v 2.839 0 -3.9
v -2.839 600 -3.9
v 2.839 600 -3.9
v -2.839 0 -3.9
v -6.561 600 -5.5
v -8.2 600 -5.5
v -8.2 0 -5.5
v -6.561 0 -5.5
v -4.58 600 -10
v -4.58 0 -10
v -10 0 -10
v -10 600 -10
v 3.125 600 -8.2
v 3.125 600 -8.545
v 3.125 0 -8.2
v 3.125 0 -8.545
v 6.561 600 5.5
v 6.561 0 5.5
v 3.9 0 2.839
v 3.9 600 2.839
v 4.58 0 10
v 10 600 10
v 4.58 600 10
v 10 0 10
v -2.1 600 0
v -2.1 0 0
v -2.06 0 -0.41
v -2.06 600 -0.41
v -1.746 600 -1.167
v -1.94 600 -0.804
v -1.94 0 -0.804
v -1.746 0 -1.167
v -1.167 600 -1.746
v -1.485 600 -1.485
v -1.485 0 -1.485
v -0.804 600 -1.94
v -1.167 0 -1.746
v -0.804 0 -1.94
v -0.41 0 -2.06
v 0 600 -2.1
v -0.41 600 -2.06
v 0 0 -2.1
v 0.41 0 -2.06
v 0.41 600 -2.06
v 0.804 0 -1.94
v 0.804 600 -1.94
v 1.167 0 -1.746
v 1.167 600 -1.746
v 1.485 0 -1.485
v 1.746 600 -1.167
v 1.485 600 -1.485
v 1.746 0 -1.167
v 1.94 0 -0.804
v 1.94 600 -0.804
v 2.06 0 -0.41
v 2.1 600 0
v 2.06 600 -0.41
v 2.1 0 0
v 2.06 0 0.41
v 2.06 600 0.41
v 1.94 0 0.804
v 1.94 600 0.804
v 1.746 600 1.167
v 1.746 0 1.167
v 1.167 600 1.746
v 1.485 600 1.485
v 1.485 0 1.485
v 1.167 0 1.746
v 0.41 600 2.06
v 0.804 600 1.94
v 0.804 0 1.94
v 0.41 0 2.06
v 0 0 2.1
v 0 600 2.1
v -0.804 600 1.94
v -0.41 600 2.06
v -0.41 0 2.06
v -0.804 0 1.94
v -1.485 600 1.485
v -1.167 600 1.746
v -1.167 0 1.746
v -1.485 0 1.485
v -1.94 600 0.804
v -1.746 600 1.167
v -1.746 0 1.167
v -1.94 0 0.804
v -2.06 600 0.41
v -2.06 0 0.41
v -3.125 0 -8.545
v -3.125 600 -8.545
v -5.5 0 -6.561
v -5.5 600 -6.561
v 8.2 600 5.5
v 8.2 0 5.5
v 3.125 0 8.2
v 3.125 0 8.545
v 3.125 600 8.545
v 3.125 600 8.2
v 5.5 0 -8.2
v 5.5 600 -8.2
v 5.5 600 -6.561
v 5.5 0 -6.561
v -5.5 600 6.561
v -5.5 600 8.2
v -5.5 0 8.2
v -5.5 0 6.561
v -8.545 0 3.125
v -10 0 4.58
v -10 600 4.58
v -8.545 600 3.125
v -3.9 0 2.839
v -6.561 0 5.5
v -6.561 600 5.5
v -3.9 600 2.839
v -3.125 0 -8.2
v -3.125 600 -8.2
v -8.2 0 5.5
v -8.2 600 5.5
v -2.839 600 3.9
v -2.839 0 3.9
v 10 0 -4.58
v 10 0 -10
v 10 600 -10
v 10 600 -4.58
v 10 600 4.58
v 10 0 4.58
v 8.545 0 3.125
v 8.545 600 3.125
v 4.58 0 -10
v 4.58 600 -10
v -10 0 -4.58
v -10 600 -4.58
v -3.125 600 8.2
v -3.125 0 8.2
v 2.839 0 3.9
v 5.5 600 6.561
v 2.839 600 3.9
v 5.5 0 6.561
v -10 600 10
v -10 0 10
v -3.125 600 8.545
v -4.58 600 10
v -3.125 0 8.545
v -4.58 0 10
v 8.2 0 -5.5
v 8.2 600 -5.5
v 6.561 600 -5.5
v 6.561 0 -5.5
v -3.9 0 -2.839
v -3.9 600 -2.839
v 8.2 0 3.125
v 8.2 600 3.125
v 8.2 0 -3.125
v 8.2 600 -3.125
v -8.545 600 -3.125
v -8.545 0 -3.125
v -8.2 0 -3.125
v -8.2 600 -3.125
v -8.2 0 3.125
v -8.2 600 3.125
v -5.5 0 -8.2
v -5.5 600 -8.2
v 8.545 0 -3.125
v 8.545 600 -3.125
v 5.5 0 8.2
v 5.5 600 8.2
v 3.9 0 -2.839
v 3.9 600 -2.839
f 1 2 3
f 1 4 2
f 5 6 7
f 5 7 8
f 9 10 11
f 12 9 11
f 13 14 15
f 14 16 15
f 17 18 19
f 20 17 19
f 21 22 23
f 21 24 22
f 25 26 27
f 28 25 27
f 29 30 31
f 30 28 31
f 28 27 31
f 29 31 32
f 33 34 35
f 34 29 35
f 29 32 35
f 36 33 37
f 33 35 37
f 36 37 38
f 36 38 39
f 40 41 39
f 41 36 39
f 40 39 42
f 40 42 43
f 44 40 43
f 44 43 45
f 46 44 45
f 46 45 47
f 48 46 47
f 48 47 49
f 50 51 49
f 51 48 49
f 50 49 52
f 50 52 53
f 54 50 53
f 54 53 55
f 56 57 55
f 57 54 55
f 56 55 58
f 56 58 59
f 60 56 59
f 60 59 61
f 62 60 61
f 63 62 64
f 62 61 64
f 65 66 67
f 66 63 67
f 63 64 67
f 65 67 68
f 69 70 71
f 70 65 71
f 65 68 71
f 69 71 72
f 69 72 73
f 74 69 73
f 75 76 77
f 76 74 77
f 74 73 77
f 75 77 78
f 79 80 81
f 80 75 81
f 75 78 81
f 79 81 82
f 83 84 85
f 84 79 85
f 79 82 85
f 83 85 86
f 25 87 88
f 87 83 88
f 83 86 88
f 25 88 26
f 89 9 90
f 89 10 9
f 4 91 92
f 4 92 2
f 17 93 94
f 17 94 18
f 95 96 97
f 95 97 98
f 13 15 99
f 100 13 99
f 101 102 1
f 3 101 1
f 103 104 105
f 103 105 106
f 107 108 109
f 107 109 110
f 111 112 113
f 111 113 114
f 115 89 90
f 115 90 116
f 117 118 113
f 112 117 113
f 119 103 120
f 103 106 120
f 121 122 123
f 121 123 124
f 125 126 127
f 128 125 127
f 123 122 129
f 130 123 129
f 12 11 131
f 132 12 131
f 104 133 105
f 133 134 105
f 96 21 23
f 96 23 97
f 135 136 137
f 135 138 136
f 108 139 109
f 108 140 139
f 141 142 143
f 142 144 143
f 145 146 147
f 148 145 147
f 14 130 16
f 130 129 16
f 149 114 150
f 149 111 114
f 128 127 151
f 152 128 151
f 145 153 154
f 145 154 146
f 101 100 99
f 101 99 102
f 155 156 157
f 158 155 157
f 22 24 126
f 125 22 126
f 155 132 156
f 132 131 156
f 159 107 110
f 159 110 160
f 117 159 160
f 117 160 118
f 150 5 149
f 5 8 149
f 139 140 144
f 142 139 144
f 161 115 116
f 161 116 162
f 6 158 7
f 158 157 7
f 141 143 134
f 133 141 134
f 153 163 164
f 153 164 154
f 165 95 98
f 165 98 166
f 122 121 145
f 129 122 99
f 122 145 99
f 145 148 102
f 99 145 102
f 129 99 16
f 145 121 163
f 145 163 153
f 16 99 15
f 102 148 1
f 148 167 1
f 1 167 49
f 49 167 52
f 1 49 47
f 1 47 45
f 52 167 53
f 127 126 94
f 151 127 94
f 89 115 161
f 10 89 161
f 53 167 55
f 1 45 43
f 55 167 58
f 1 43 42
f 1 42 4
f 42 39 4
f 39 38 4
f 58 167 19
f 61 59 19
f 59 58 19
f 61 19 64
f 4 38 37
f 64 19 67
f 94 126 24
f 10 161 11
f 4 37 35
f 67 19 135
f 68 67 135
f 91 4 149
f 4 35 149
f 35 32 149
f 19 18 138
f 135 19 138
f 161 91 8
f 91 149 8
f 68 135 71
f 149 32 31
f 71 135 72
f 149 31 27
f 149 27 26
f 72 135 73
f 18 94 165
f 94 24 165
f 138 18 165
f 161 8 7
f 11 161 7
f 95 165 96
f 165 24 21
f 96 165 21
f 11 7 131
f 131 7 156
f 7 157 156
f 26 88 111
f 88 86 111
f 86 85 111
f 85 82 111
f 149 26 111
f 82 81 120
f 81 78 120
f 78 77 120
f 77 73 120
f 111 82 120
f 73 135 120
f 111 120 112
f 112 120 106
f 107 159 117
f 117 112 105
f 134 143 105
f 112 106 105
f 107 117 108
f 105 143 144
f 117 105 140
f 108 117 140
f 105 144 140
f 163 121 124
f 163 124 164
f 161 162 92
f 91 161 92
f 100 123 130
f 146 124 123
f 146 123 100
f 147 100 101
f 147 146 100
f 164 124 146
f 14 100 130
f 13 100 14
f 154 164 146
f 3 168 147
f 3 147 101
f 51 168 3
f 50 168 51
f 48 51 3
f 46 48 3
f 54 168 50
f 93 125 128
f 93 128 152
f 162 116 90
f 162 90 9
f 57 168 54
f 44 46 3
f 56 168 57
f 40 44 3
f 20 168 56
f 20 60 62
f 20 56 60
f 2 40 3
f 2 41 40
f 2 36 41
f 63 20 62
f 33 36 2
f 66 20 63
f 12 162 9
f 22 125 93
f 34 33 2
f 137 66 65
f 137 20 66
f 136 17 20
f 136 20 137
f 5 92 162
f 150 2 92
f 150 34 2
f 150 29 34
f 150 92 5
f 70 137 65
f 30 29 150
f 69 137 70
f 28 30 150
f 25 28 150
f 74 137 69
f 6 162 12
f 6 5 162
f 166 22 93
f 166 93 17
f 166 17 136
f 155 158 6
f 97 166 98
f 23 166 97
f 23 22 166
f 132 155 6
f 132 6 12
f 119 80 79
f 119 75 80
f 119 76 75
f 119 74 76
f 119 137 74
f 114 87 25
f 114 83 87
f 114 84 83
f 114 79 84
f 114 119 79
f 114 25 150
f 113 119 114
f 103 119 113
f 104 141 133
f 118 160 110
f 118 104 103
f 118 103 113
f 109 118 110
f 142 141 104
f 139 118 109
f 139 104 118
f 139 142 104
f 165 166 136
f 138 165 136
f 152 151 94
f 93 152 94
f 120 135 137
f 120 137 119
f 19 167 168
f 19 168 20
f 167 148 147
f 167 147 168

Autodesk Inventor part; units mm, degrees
ref_plane "YZ Plane" through (0, 0, 0) normal (1, 0, 0) x (0, 1, 0)
ref_plane "XZ Plane" through (0, 0, 0) normal (0, 1, 0) x (-1, 0, 0)
ref_plane "XY Plane" through (0, 0, 0) normal (0, 0, 1) x (1, 0, 0)
sketch "Sketch1" plane through (0, 0, 0) normal (0, 1, 0) x (-1, 0, 0)
  circle A0 centre (0, 0) radius 2.1
  line L0 (10, 10) -> (-10, 10) construction
  line L1 (-10, 10) -> (-10, -10) construction
  line L2 (-10, -10) -> (10, -10)
  line L3 (10, -10) -> (10, 10) construction
  line L4 (10, 10) -> (-10, -10) construction
  line L5 (-10, 10) -> (10, -10) construction
  line L6 (8.2, 10) -> (8.2, -10) construction
  line L7 (3.9, 10) -> (3.9, -10) construction
  line L8 (8.2, 3.125) -> (8.2, -3.125) construction
  line L9 (10, 4.58) -> (10, -4.58) construction
  line L10 (8.2, 5.5) -> (8.2, -5.5) construction
  line L11 (3.3697, 4.4303) -> (4.4303, 3.3697) construction
  line L12 (10, 10) -> (10, 4.58)
  line L13 (10, 4.58) -> (8.545, 3.125)
  line L14 (8.545, 3.125) -> (8.2, 3.125)
  line L15 (8.2, 3.125) -> (8.2, 5.5)
  line L16 (14, 0) -> (-14, 0) construction
  line L17 (8.2, 5.5) -> (6.5607, 5.5)
  line L18 (6.5607, 5.5) -> (3.9, 2.8393)
  line L19 (3.9, 2.8393) -> (3.9, 0)
  line L20 (10, -10) -> (10, -4.58)
  line L21 (10, -4.58) -> (8.545, -3.125)
  line L22 (8.545, -3.125) -> (8.2, -3.125)
  line L23 (8.2, -3.125) -> (8.2, -5.5)
  line L24 (8.2, -5.5) -> (6.5607, -5.5)
  line L25 (6.5607, -5.5) -> (3.9, -2.8393)
  line L26 (3.9, -2.8393) -> (3.9, 0)
  line L27 (-10, 10) -> (-4.58, 10)
  line L28 (-4.58, 10) -> (-3.125, 8.545)
  line L29 (-3.125, 8.2) -> (-5.5, 8.2)
  line L30 (-5.5, 8.2) -> (-5.5, 6.5607)
  line L31 (-5.5, 6.5607) -> (-2.8393, 3.9)
  line L32 (-2.8393, 3.9) -> (0, 3.9)
  line L33 (2.8393, 3.9) -> (0, 3.9)
  line L34 (5.5, 6.5607) -> (2.8393, 3.9)
  line L35 (5.5, 8.2) -> (5.5, 6.5607)
  line L36 (3.125, 8.2) -> (5.5, 8.2)
  line L37 (3.125, 8.545) -> (3.125, 8.2)
  line L38 (4.58, 10) -> (3.125, 8.545)
  line L39 (-3.125, 8.545) -> (-3.125, 8.2)
  line L40 (10, 10) -> (4.58, 10)
  line L41 (-10, -10) -> (-10, -4.58)
  line L42 (-10, -4.58) -> (-8.545, -3.125)
  line L43 (-8.2, -3.125) -> (-8.2, -5.5)
  line L44 (-8.2, -5.5) -> (-6.5607, -5.5)
  line L45 (-6.5607, -5.5) -> (-3.9, -2.8393)
  line L46 (-3.9, -2.8393) -> (-3.9, 0)
  line L47 (-3.9, 2.8393) -> (-3.9, 0)
  line L48 (-6.5607, 5.5) -> (-3.9, 2.8393)
  line L49 (-8.2, 5.5) -> (-6.5607, 5.5)
  line L50 (-8.2, 3.125) -> (-8.2, 5.5)
  line L51 (-8.545, 3.125) -> (-8.2, 3.125)
  line L52 (-10, 4.58) -> (-8.545, 3.125)
  line L53 (-8.545, -3.125) -> (-8.2, -3.125)
  line L54 (-10, 10) -> (-10, 4.58)
  line L55 (10, -10) -> (4.58, -10) construction
  line L56 (4.58, -10) -> (3.125, -8.545)
  line L57 (3.125, -8.2) -> (5.5, -8.2)
  line L58 (5.5, -8.2) -> (5.5, -6.5607)
  line L59 (5.5, -6.5607) -> (2.8393, -3.9)
  line L60 (2.8393, -3.9) -> (0, -3.9)
  line L61 (-2.8393, -3.9) -> (0, -3.9)
  line L62 (-5.5, -6.5607) -> (-2.8393, -3.9)
  line L63 (-5.5, -8.2) -> (-5.5, -6.5607)
  line L64 (-3.125, -8.2) -> (-5.5, -8.2)
  line L65 (-3.125, -8.545) -> (-3.125, -8.2)
  line L66 (-4.58, -10) -> (-3.125, -8.545)
  line L67 (3.125, -8.545) -> (3.125, -8.2)
  line L68 (-10, -10) -> (-4.58, -10) construction
  line L69 (5.5, -6.5607) -> (6.2393, -7.3)
  line L70 (6.2393, -7.3) -> (8.2, -7.3)
  line L71 (0, -10) -> (0, -9) construction
  line L72 (-5.5, -6.5607) -> (-6.2393, -7.3)
  line L73 (-6.2393, -7.3) -> (-8.2, -7.3)
  line L74 (8.2, -7.3) -> (8.2, -10)
  line L75 (-8.2, -7.3) -> (-8.2, -10)
  circle A1 centre (0, -20) radius 2.1
  line L76 (10, -30) -> (10, -24.58)
  line L77 (10, -24.58) -> (8.545, -23.125)
  line L78 (8.545, -23.125) -> (8.2, -23.125)
  line L79 (8.2, -23.125) -> (8.2, -25.5)
  line L80 (8.2, -25.5) -> (6.5607, -25.5)
  line L81 (6.5607, -25.5) -> (3.9, -22.8393)
  line L82 (3.9, -22.8393) -> (3.9, -20)
  line L83 (10, -10) -> (10, -15.42)
  line L84 (10, -15.42) -> (8.545, -16.875)
  line L85 (8.2, -16.875) -> (8.2, -14.5)
  line L86 (8.2, -14.5) -> (6.5607, -14.5)
  line L87 (6.5607, -14.5) -> (3.9, -17.1607)
  line L88 (3.9, -17.1607) -> (3.9, -20)
  line L89 (-10, -30) -> (-4.58, -30)
  line L90 (-4.58, -30) -> (-3.125, -28.545)
  line L91 (-3.125, -28.2) -> (-5.5, -28.2)
  line L92 (-5.5, -28.2) -> (-5.5, -26.5607)
  line L93 (-5.5, -26.5607) -> (-2.8393, -23.9)
  line L94 (-2.8393, -23.9) -> (0, -23.9)
  line L95 (2.8393, -23.9) -> (0, -23.9)
  line L96 (5.5, -26.5607) -> (2.8393, -23.9)
  line L97 (5.5, -28.2) -> (5.5, -26.5607)
  line L98 (3.125, -28.2) -> (5.5, -28.2)
  line L99 (3.125, -28.545) -> (3.125, -28.2)
  line L100 (4.58, -30) -> (3.125, -28.545)
  line L101 (-3.125, -28.545) -> (-3.125, -28.2)
  line L102 (10, -30) -> (4.58, -30)
  line L103 (-10, -10) -> (-10, -15.42)
  line L104 (-10, -15.42) -> (-8.545, -16.875)
  line L105 (-8.2, -16.875) -> (-8.2, -14.5)
  line L106 (-8.2, -14.5) -> (-6.5607, -14.5)
  line L107 (-6.5607, -14.5) -> (-3.9, -17.1607)
  line L108 (-3.9, -17.1607) -> (-3.9, -20)
  line L109 (-3.9, -22.8393) -> (-3.9, -20)
  line L110 (-6.5607, -25.5) -> (-3.9, -22.8393)
  line L111 (-8.2, -25.5) -> (-6.5607, -25.5)
  line L112 (-8.2, -23.125) -> (-8.2, -25.5)
  line L113 (-8.545, -23.125) -> (-8.2, -23.125)
  line L114 (-10, -24.58) -> (-8.545, -23.125)
  line L115 (-8.545, -16.875) -> (-8.2, -16.875)
  line L116 (-10, -30) -> (-10, -24.58)
  line L117 (5.5, -13.4393) -> (2.8393, -16.1)
  line L118 (2.8393, -16.1) -> (0, -16.1)
  line L119 (-2.8393, -16.1) -> (0, -16.1)
  line L120 (-5.5, -13.4393) -> (-2.8393, -16.1)
  line L121 (5.5, -13.4393) -> (6.2393, -12.7)
  line L122 (6.2393, -12.7) -> (8.2, -12.7)
  line L123 (-5.5, -13.4393) -> (-6.2393, -12.7)
  line L124 (-6.2393, -12.7) -> (-8.2, -12.7)
  line L125 (8.2, -12.7) -> (8.2, -10)
  line L126 (-8.2, -12.7) -> (-8.2, -10)
  line L127 (8.545, -16.875) -> (8.2, -16.875)
  point P0 (10, 0)
  point P1 (8.2, 0)
  point P2 (3.9, 3.9)
  point P3 (-3.3697, 4.4303)
  point P4 (-4.4303, -3.3697)
  point P5 (3.3697, -4.4303)
  dimension "d0" = 4.2
  dimension "d1" = 20
  dimension "d2" = 20
  dimension "d3" = 1.8
  dimension "d4" = 4.3
  dimension "d5" = 6.25
  dimension "d6" = 9.16
  dimension "d7" = 11
  dimension "d8" = 1.5
  dimension "d9" = 45
  dimension "d12" = 360
  dimension "d17" = 1.8
  dimension "d18" = 1
extrude "Extrusion1" add sketch "Sketch1" along normal blind 600 contours L41 L42 L53 L43 L44 L45 L46 L47 L48 L49 L50 L51 L52 L54 L27 L28 L39 L29 L30 L31 L32 L33 L34 L35 L36 L37 L38 L40 L12 L13 L14 L15 L17 L18 L19 L26 L25 L24 L23 L22 L21 L20 L2 L74 L70 L69 L59 L60 L61 L62 L72 L73 L75 | L75 L73 L72 L63 L64 L65 L66 L2 | L56 L67 L57 L58 L69 L70 L74 L2
ref_plane "Work Plane1" through (-2.8393, 0, 0) normal (0, 0, -1) x (-1, 0, 0)
ref_plane "Work Plane2" through (0, 0, 4.58) normal (1, 0, 0) x (0, 0, -1)
ref_plane "Work Plane3" through (0, 300, 0) normal (0, 1, 0) x (1, 0, 0)
ref_plane "Work Plane4" through (-4.58, 0, 0) normal (0, 0, 1) x (1, 0, 0)
properties part number "VSLOT 2020 Extrusion" material "Aluminum 6061"
